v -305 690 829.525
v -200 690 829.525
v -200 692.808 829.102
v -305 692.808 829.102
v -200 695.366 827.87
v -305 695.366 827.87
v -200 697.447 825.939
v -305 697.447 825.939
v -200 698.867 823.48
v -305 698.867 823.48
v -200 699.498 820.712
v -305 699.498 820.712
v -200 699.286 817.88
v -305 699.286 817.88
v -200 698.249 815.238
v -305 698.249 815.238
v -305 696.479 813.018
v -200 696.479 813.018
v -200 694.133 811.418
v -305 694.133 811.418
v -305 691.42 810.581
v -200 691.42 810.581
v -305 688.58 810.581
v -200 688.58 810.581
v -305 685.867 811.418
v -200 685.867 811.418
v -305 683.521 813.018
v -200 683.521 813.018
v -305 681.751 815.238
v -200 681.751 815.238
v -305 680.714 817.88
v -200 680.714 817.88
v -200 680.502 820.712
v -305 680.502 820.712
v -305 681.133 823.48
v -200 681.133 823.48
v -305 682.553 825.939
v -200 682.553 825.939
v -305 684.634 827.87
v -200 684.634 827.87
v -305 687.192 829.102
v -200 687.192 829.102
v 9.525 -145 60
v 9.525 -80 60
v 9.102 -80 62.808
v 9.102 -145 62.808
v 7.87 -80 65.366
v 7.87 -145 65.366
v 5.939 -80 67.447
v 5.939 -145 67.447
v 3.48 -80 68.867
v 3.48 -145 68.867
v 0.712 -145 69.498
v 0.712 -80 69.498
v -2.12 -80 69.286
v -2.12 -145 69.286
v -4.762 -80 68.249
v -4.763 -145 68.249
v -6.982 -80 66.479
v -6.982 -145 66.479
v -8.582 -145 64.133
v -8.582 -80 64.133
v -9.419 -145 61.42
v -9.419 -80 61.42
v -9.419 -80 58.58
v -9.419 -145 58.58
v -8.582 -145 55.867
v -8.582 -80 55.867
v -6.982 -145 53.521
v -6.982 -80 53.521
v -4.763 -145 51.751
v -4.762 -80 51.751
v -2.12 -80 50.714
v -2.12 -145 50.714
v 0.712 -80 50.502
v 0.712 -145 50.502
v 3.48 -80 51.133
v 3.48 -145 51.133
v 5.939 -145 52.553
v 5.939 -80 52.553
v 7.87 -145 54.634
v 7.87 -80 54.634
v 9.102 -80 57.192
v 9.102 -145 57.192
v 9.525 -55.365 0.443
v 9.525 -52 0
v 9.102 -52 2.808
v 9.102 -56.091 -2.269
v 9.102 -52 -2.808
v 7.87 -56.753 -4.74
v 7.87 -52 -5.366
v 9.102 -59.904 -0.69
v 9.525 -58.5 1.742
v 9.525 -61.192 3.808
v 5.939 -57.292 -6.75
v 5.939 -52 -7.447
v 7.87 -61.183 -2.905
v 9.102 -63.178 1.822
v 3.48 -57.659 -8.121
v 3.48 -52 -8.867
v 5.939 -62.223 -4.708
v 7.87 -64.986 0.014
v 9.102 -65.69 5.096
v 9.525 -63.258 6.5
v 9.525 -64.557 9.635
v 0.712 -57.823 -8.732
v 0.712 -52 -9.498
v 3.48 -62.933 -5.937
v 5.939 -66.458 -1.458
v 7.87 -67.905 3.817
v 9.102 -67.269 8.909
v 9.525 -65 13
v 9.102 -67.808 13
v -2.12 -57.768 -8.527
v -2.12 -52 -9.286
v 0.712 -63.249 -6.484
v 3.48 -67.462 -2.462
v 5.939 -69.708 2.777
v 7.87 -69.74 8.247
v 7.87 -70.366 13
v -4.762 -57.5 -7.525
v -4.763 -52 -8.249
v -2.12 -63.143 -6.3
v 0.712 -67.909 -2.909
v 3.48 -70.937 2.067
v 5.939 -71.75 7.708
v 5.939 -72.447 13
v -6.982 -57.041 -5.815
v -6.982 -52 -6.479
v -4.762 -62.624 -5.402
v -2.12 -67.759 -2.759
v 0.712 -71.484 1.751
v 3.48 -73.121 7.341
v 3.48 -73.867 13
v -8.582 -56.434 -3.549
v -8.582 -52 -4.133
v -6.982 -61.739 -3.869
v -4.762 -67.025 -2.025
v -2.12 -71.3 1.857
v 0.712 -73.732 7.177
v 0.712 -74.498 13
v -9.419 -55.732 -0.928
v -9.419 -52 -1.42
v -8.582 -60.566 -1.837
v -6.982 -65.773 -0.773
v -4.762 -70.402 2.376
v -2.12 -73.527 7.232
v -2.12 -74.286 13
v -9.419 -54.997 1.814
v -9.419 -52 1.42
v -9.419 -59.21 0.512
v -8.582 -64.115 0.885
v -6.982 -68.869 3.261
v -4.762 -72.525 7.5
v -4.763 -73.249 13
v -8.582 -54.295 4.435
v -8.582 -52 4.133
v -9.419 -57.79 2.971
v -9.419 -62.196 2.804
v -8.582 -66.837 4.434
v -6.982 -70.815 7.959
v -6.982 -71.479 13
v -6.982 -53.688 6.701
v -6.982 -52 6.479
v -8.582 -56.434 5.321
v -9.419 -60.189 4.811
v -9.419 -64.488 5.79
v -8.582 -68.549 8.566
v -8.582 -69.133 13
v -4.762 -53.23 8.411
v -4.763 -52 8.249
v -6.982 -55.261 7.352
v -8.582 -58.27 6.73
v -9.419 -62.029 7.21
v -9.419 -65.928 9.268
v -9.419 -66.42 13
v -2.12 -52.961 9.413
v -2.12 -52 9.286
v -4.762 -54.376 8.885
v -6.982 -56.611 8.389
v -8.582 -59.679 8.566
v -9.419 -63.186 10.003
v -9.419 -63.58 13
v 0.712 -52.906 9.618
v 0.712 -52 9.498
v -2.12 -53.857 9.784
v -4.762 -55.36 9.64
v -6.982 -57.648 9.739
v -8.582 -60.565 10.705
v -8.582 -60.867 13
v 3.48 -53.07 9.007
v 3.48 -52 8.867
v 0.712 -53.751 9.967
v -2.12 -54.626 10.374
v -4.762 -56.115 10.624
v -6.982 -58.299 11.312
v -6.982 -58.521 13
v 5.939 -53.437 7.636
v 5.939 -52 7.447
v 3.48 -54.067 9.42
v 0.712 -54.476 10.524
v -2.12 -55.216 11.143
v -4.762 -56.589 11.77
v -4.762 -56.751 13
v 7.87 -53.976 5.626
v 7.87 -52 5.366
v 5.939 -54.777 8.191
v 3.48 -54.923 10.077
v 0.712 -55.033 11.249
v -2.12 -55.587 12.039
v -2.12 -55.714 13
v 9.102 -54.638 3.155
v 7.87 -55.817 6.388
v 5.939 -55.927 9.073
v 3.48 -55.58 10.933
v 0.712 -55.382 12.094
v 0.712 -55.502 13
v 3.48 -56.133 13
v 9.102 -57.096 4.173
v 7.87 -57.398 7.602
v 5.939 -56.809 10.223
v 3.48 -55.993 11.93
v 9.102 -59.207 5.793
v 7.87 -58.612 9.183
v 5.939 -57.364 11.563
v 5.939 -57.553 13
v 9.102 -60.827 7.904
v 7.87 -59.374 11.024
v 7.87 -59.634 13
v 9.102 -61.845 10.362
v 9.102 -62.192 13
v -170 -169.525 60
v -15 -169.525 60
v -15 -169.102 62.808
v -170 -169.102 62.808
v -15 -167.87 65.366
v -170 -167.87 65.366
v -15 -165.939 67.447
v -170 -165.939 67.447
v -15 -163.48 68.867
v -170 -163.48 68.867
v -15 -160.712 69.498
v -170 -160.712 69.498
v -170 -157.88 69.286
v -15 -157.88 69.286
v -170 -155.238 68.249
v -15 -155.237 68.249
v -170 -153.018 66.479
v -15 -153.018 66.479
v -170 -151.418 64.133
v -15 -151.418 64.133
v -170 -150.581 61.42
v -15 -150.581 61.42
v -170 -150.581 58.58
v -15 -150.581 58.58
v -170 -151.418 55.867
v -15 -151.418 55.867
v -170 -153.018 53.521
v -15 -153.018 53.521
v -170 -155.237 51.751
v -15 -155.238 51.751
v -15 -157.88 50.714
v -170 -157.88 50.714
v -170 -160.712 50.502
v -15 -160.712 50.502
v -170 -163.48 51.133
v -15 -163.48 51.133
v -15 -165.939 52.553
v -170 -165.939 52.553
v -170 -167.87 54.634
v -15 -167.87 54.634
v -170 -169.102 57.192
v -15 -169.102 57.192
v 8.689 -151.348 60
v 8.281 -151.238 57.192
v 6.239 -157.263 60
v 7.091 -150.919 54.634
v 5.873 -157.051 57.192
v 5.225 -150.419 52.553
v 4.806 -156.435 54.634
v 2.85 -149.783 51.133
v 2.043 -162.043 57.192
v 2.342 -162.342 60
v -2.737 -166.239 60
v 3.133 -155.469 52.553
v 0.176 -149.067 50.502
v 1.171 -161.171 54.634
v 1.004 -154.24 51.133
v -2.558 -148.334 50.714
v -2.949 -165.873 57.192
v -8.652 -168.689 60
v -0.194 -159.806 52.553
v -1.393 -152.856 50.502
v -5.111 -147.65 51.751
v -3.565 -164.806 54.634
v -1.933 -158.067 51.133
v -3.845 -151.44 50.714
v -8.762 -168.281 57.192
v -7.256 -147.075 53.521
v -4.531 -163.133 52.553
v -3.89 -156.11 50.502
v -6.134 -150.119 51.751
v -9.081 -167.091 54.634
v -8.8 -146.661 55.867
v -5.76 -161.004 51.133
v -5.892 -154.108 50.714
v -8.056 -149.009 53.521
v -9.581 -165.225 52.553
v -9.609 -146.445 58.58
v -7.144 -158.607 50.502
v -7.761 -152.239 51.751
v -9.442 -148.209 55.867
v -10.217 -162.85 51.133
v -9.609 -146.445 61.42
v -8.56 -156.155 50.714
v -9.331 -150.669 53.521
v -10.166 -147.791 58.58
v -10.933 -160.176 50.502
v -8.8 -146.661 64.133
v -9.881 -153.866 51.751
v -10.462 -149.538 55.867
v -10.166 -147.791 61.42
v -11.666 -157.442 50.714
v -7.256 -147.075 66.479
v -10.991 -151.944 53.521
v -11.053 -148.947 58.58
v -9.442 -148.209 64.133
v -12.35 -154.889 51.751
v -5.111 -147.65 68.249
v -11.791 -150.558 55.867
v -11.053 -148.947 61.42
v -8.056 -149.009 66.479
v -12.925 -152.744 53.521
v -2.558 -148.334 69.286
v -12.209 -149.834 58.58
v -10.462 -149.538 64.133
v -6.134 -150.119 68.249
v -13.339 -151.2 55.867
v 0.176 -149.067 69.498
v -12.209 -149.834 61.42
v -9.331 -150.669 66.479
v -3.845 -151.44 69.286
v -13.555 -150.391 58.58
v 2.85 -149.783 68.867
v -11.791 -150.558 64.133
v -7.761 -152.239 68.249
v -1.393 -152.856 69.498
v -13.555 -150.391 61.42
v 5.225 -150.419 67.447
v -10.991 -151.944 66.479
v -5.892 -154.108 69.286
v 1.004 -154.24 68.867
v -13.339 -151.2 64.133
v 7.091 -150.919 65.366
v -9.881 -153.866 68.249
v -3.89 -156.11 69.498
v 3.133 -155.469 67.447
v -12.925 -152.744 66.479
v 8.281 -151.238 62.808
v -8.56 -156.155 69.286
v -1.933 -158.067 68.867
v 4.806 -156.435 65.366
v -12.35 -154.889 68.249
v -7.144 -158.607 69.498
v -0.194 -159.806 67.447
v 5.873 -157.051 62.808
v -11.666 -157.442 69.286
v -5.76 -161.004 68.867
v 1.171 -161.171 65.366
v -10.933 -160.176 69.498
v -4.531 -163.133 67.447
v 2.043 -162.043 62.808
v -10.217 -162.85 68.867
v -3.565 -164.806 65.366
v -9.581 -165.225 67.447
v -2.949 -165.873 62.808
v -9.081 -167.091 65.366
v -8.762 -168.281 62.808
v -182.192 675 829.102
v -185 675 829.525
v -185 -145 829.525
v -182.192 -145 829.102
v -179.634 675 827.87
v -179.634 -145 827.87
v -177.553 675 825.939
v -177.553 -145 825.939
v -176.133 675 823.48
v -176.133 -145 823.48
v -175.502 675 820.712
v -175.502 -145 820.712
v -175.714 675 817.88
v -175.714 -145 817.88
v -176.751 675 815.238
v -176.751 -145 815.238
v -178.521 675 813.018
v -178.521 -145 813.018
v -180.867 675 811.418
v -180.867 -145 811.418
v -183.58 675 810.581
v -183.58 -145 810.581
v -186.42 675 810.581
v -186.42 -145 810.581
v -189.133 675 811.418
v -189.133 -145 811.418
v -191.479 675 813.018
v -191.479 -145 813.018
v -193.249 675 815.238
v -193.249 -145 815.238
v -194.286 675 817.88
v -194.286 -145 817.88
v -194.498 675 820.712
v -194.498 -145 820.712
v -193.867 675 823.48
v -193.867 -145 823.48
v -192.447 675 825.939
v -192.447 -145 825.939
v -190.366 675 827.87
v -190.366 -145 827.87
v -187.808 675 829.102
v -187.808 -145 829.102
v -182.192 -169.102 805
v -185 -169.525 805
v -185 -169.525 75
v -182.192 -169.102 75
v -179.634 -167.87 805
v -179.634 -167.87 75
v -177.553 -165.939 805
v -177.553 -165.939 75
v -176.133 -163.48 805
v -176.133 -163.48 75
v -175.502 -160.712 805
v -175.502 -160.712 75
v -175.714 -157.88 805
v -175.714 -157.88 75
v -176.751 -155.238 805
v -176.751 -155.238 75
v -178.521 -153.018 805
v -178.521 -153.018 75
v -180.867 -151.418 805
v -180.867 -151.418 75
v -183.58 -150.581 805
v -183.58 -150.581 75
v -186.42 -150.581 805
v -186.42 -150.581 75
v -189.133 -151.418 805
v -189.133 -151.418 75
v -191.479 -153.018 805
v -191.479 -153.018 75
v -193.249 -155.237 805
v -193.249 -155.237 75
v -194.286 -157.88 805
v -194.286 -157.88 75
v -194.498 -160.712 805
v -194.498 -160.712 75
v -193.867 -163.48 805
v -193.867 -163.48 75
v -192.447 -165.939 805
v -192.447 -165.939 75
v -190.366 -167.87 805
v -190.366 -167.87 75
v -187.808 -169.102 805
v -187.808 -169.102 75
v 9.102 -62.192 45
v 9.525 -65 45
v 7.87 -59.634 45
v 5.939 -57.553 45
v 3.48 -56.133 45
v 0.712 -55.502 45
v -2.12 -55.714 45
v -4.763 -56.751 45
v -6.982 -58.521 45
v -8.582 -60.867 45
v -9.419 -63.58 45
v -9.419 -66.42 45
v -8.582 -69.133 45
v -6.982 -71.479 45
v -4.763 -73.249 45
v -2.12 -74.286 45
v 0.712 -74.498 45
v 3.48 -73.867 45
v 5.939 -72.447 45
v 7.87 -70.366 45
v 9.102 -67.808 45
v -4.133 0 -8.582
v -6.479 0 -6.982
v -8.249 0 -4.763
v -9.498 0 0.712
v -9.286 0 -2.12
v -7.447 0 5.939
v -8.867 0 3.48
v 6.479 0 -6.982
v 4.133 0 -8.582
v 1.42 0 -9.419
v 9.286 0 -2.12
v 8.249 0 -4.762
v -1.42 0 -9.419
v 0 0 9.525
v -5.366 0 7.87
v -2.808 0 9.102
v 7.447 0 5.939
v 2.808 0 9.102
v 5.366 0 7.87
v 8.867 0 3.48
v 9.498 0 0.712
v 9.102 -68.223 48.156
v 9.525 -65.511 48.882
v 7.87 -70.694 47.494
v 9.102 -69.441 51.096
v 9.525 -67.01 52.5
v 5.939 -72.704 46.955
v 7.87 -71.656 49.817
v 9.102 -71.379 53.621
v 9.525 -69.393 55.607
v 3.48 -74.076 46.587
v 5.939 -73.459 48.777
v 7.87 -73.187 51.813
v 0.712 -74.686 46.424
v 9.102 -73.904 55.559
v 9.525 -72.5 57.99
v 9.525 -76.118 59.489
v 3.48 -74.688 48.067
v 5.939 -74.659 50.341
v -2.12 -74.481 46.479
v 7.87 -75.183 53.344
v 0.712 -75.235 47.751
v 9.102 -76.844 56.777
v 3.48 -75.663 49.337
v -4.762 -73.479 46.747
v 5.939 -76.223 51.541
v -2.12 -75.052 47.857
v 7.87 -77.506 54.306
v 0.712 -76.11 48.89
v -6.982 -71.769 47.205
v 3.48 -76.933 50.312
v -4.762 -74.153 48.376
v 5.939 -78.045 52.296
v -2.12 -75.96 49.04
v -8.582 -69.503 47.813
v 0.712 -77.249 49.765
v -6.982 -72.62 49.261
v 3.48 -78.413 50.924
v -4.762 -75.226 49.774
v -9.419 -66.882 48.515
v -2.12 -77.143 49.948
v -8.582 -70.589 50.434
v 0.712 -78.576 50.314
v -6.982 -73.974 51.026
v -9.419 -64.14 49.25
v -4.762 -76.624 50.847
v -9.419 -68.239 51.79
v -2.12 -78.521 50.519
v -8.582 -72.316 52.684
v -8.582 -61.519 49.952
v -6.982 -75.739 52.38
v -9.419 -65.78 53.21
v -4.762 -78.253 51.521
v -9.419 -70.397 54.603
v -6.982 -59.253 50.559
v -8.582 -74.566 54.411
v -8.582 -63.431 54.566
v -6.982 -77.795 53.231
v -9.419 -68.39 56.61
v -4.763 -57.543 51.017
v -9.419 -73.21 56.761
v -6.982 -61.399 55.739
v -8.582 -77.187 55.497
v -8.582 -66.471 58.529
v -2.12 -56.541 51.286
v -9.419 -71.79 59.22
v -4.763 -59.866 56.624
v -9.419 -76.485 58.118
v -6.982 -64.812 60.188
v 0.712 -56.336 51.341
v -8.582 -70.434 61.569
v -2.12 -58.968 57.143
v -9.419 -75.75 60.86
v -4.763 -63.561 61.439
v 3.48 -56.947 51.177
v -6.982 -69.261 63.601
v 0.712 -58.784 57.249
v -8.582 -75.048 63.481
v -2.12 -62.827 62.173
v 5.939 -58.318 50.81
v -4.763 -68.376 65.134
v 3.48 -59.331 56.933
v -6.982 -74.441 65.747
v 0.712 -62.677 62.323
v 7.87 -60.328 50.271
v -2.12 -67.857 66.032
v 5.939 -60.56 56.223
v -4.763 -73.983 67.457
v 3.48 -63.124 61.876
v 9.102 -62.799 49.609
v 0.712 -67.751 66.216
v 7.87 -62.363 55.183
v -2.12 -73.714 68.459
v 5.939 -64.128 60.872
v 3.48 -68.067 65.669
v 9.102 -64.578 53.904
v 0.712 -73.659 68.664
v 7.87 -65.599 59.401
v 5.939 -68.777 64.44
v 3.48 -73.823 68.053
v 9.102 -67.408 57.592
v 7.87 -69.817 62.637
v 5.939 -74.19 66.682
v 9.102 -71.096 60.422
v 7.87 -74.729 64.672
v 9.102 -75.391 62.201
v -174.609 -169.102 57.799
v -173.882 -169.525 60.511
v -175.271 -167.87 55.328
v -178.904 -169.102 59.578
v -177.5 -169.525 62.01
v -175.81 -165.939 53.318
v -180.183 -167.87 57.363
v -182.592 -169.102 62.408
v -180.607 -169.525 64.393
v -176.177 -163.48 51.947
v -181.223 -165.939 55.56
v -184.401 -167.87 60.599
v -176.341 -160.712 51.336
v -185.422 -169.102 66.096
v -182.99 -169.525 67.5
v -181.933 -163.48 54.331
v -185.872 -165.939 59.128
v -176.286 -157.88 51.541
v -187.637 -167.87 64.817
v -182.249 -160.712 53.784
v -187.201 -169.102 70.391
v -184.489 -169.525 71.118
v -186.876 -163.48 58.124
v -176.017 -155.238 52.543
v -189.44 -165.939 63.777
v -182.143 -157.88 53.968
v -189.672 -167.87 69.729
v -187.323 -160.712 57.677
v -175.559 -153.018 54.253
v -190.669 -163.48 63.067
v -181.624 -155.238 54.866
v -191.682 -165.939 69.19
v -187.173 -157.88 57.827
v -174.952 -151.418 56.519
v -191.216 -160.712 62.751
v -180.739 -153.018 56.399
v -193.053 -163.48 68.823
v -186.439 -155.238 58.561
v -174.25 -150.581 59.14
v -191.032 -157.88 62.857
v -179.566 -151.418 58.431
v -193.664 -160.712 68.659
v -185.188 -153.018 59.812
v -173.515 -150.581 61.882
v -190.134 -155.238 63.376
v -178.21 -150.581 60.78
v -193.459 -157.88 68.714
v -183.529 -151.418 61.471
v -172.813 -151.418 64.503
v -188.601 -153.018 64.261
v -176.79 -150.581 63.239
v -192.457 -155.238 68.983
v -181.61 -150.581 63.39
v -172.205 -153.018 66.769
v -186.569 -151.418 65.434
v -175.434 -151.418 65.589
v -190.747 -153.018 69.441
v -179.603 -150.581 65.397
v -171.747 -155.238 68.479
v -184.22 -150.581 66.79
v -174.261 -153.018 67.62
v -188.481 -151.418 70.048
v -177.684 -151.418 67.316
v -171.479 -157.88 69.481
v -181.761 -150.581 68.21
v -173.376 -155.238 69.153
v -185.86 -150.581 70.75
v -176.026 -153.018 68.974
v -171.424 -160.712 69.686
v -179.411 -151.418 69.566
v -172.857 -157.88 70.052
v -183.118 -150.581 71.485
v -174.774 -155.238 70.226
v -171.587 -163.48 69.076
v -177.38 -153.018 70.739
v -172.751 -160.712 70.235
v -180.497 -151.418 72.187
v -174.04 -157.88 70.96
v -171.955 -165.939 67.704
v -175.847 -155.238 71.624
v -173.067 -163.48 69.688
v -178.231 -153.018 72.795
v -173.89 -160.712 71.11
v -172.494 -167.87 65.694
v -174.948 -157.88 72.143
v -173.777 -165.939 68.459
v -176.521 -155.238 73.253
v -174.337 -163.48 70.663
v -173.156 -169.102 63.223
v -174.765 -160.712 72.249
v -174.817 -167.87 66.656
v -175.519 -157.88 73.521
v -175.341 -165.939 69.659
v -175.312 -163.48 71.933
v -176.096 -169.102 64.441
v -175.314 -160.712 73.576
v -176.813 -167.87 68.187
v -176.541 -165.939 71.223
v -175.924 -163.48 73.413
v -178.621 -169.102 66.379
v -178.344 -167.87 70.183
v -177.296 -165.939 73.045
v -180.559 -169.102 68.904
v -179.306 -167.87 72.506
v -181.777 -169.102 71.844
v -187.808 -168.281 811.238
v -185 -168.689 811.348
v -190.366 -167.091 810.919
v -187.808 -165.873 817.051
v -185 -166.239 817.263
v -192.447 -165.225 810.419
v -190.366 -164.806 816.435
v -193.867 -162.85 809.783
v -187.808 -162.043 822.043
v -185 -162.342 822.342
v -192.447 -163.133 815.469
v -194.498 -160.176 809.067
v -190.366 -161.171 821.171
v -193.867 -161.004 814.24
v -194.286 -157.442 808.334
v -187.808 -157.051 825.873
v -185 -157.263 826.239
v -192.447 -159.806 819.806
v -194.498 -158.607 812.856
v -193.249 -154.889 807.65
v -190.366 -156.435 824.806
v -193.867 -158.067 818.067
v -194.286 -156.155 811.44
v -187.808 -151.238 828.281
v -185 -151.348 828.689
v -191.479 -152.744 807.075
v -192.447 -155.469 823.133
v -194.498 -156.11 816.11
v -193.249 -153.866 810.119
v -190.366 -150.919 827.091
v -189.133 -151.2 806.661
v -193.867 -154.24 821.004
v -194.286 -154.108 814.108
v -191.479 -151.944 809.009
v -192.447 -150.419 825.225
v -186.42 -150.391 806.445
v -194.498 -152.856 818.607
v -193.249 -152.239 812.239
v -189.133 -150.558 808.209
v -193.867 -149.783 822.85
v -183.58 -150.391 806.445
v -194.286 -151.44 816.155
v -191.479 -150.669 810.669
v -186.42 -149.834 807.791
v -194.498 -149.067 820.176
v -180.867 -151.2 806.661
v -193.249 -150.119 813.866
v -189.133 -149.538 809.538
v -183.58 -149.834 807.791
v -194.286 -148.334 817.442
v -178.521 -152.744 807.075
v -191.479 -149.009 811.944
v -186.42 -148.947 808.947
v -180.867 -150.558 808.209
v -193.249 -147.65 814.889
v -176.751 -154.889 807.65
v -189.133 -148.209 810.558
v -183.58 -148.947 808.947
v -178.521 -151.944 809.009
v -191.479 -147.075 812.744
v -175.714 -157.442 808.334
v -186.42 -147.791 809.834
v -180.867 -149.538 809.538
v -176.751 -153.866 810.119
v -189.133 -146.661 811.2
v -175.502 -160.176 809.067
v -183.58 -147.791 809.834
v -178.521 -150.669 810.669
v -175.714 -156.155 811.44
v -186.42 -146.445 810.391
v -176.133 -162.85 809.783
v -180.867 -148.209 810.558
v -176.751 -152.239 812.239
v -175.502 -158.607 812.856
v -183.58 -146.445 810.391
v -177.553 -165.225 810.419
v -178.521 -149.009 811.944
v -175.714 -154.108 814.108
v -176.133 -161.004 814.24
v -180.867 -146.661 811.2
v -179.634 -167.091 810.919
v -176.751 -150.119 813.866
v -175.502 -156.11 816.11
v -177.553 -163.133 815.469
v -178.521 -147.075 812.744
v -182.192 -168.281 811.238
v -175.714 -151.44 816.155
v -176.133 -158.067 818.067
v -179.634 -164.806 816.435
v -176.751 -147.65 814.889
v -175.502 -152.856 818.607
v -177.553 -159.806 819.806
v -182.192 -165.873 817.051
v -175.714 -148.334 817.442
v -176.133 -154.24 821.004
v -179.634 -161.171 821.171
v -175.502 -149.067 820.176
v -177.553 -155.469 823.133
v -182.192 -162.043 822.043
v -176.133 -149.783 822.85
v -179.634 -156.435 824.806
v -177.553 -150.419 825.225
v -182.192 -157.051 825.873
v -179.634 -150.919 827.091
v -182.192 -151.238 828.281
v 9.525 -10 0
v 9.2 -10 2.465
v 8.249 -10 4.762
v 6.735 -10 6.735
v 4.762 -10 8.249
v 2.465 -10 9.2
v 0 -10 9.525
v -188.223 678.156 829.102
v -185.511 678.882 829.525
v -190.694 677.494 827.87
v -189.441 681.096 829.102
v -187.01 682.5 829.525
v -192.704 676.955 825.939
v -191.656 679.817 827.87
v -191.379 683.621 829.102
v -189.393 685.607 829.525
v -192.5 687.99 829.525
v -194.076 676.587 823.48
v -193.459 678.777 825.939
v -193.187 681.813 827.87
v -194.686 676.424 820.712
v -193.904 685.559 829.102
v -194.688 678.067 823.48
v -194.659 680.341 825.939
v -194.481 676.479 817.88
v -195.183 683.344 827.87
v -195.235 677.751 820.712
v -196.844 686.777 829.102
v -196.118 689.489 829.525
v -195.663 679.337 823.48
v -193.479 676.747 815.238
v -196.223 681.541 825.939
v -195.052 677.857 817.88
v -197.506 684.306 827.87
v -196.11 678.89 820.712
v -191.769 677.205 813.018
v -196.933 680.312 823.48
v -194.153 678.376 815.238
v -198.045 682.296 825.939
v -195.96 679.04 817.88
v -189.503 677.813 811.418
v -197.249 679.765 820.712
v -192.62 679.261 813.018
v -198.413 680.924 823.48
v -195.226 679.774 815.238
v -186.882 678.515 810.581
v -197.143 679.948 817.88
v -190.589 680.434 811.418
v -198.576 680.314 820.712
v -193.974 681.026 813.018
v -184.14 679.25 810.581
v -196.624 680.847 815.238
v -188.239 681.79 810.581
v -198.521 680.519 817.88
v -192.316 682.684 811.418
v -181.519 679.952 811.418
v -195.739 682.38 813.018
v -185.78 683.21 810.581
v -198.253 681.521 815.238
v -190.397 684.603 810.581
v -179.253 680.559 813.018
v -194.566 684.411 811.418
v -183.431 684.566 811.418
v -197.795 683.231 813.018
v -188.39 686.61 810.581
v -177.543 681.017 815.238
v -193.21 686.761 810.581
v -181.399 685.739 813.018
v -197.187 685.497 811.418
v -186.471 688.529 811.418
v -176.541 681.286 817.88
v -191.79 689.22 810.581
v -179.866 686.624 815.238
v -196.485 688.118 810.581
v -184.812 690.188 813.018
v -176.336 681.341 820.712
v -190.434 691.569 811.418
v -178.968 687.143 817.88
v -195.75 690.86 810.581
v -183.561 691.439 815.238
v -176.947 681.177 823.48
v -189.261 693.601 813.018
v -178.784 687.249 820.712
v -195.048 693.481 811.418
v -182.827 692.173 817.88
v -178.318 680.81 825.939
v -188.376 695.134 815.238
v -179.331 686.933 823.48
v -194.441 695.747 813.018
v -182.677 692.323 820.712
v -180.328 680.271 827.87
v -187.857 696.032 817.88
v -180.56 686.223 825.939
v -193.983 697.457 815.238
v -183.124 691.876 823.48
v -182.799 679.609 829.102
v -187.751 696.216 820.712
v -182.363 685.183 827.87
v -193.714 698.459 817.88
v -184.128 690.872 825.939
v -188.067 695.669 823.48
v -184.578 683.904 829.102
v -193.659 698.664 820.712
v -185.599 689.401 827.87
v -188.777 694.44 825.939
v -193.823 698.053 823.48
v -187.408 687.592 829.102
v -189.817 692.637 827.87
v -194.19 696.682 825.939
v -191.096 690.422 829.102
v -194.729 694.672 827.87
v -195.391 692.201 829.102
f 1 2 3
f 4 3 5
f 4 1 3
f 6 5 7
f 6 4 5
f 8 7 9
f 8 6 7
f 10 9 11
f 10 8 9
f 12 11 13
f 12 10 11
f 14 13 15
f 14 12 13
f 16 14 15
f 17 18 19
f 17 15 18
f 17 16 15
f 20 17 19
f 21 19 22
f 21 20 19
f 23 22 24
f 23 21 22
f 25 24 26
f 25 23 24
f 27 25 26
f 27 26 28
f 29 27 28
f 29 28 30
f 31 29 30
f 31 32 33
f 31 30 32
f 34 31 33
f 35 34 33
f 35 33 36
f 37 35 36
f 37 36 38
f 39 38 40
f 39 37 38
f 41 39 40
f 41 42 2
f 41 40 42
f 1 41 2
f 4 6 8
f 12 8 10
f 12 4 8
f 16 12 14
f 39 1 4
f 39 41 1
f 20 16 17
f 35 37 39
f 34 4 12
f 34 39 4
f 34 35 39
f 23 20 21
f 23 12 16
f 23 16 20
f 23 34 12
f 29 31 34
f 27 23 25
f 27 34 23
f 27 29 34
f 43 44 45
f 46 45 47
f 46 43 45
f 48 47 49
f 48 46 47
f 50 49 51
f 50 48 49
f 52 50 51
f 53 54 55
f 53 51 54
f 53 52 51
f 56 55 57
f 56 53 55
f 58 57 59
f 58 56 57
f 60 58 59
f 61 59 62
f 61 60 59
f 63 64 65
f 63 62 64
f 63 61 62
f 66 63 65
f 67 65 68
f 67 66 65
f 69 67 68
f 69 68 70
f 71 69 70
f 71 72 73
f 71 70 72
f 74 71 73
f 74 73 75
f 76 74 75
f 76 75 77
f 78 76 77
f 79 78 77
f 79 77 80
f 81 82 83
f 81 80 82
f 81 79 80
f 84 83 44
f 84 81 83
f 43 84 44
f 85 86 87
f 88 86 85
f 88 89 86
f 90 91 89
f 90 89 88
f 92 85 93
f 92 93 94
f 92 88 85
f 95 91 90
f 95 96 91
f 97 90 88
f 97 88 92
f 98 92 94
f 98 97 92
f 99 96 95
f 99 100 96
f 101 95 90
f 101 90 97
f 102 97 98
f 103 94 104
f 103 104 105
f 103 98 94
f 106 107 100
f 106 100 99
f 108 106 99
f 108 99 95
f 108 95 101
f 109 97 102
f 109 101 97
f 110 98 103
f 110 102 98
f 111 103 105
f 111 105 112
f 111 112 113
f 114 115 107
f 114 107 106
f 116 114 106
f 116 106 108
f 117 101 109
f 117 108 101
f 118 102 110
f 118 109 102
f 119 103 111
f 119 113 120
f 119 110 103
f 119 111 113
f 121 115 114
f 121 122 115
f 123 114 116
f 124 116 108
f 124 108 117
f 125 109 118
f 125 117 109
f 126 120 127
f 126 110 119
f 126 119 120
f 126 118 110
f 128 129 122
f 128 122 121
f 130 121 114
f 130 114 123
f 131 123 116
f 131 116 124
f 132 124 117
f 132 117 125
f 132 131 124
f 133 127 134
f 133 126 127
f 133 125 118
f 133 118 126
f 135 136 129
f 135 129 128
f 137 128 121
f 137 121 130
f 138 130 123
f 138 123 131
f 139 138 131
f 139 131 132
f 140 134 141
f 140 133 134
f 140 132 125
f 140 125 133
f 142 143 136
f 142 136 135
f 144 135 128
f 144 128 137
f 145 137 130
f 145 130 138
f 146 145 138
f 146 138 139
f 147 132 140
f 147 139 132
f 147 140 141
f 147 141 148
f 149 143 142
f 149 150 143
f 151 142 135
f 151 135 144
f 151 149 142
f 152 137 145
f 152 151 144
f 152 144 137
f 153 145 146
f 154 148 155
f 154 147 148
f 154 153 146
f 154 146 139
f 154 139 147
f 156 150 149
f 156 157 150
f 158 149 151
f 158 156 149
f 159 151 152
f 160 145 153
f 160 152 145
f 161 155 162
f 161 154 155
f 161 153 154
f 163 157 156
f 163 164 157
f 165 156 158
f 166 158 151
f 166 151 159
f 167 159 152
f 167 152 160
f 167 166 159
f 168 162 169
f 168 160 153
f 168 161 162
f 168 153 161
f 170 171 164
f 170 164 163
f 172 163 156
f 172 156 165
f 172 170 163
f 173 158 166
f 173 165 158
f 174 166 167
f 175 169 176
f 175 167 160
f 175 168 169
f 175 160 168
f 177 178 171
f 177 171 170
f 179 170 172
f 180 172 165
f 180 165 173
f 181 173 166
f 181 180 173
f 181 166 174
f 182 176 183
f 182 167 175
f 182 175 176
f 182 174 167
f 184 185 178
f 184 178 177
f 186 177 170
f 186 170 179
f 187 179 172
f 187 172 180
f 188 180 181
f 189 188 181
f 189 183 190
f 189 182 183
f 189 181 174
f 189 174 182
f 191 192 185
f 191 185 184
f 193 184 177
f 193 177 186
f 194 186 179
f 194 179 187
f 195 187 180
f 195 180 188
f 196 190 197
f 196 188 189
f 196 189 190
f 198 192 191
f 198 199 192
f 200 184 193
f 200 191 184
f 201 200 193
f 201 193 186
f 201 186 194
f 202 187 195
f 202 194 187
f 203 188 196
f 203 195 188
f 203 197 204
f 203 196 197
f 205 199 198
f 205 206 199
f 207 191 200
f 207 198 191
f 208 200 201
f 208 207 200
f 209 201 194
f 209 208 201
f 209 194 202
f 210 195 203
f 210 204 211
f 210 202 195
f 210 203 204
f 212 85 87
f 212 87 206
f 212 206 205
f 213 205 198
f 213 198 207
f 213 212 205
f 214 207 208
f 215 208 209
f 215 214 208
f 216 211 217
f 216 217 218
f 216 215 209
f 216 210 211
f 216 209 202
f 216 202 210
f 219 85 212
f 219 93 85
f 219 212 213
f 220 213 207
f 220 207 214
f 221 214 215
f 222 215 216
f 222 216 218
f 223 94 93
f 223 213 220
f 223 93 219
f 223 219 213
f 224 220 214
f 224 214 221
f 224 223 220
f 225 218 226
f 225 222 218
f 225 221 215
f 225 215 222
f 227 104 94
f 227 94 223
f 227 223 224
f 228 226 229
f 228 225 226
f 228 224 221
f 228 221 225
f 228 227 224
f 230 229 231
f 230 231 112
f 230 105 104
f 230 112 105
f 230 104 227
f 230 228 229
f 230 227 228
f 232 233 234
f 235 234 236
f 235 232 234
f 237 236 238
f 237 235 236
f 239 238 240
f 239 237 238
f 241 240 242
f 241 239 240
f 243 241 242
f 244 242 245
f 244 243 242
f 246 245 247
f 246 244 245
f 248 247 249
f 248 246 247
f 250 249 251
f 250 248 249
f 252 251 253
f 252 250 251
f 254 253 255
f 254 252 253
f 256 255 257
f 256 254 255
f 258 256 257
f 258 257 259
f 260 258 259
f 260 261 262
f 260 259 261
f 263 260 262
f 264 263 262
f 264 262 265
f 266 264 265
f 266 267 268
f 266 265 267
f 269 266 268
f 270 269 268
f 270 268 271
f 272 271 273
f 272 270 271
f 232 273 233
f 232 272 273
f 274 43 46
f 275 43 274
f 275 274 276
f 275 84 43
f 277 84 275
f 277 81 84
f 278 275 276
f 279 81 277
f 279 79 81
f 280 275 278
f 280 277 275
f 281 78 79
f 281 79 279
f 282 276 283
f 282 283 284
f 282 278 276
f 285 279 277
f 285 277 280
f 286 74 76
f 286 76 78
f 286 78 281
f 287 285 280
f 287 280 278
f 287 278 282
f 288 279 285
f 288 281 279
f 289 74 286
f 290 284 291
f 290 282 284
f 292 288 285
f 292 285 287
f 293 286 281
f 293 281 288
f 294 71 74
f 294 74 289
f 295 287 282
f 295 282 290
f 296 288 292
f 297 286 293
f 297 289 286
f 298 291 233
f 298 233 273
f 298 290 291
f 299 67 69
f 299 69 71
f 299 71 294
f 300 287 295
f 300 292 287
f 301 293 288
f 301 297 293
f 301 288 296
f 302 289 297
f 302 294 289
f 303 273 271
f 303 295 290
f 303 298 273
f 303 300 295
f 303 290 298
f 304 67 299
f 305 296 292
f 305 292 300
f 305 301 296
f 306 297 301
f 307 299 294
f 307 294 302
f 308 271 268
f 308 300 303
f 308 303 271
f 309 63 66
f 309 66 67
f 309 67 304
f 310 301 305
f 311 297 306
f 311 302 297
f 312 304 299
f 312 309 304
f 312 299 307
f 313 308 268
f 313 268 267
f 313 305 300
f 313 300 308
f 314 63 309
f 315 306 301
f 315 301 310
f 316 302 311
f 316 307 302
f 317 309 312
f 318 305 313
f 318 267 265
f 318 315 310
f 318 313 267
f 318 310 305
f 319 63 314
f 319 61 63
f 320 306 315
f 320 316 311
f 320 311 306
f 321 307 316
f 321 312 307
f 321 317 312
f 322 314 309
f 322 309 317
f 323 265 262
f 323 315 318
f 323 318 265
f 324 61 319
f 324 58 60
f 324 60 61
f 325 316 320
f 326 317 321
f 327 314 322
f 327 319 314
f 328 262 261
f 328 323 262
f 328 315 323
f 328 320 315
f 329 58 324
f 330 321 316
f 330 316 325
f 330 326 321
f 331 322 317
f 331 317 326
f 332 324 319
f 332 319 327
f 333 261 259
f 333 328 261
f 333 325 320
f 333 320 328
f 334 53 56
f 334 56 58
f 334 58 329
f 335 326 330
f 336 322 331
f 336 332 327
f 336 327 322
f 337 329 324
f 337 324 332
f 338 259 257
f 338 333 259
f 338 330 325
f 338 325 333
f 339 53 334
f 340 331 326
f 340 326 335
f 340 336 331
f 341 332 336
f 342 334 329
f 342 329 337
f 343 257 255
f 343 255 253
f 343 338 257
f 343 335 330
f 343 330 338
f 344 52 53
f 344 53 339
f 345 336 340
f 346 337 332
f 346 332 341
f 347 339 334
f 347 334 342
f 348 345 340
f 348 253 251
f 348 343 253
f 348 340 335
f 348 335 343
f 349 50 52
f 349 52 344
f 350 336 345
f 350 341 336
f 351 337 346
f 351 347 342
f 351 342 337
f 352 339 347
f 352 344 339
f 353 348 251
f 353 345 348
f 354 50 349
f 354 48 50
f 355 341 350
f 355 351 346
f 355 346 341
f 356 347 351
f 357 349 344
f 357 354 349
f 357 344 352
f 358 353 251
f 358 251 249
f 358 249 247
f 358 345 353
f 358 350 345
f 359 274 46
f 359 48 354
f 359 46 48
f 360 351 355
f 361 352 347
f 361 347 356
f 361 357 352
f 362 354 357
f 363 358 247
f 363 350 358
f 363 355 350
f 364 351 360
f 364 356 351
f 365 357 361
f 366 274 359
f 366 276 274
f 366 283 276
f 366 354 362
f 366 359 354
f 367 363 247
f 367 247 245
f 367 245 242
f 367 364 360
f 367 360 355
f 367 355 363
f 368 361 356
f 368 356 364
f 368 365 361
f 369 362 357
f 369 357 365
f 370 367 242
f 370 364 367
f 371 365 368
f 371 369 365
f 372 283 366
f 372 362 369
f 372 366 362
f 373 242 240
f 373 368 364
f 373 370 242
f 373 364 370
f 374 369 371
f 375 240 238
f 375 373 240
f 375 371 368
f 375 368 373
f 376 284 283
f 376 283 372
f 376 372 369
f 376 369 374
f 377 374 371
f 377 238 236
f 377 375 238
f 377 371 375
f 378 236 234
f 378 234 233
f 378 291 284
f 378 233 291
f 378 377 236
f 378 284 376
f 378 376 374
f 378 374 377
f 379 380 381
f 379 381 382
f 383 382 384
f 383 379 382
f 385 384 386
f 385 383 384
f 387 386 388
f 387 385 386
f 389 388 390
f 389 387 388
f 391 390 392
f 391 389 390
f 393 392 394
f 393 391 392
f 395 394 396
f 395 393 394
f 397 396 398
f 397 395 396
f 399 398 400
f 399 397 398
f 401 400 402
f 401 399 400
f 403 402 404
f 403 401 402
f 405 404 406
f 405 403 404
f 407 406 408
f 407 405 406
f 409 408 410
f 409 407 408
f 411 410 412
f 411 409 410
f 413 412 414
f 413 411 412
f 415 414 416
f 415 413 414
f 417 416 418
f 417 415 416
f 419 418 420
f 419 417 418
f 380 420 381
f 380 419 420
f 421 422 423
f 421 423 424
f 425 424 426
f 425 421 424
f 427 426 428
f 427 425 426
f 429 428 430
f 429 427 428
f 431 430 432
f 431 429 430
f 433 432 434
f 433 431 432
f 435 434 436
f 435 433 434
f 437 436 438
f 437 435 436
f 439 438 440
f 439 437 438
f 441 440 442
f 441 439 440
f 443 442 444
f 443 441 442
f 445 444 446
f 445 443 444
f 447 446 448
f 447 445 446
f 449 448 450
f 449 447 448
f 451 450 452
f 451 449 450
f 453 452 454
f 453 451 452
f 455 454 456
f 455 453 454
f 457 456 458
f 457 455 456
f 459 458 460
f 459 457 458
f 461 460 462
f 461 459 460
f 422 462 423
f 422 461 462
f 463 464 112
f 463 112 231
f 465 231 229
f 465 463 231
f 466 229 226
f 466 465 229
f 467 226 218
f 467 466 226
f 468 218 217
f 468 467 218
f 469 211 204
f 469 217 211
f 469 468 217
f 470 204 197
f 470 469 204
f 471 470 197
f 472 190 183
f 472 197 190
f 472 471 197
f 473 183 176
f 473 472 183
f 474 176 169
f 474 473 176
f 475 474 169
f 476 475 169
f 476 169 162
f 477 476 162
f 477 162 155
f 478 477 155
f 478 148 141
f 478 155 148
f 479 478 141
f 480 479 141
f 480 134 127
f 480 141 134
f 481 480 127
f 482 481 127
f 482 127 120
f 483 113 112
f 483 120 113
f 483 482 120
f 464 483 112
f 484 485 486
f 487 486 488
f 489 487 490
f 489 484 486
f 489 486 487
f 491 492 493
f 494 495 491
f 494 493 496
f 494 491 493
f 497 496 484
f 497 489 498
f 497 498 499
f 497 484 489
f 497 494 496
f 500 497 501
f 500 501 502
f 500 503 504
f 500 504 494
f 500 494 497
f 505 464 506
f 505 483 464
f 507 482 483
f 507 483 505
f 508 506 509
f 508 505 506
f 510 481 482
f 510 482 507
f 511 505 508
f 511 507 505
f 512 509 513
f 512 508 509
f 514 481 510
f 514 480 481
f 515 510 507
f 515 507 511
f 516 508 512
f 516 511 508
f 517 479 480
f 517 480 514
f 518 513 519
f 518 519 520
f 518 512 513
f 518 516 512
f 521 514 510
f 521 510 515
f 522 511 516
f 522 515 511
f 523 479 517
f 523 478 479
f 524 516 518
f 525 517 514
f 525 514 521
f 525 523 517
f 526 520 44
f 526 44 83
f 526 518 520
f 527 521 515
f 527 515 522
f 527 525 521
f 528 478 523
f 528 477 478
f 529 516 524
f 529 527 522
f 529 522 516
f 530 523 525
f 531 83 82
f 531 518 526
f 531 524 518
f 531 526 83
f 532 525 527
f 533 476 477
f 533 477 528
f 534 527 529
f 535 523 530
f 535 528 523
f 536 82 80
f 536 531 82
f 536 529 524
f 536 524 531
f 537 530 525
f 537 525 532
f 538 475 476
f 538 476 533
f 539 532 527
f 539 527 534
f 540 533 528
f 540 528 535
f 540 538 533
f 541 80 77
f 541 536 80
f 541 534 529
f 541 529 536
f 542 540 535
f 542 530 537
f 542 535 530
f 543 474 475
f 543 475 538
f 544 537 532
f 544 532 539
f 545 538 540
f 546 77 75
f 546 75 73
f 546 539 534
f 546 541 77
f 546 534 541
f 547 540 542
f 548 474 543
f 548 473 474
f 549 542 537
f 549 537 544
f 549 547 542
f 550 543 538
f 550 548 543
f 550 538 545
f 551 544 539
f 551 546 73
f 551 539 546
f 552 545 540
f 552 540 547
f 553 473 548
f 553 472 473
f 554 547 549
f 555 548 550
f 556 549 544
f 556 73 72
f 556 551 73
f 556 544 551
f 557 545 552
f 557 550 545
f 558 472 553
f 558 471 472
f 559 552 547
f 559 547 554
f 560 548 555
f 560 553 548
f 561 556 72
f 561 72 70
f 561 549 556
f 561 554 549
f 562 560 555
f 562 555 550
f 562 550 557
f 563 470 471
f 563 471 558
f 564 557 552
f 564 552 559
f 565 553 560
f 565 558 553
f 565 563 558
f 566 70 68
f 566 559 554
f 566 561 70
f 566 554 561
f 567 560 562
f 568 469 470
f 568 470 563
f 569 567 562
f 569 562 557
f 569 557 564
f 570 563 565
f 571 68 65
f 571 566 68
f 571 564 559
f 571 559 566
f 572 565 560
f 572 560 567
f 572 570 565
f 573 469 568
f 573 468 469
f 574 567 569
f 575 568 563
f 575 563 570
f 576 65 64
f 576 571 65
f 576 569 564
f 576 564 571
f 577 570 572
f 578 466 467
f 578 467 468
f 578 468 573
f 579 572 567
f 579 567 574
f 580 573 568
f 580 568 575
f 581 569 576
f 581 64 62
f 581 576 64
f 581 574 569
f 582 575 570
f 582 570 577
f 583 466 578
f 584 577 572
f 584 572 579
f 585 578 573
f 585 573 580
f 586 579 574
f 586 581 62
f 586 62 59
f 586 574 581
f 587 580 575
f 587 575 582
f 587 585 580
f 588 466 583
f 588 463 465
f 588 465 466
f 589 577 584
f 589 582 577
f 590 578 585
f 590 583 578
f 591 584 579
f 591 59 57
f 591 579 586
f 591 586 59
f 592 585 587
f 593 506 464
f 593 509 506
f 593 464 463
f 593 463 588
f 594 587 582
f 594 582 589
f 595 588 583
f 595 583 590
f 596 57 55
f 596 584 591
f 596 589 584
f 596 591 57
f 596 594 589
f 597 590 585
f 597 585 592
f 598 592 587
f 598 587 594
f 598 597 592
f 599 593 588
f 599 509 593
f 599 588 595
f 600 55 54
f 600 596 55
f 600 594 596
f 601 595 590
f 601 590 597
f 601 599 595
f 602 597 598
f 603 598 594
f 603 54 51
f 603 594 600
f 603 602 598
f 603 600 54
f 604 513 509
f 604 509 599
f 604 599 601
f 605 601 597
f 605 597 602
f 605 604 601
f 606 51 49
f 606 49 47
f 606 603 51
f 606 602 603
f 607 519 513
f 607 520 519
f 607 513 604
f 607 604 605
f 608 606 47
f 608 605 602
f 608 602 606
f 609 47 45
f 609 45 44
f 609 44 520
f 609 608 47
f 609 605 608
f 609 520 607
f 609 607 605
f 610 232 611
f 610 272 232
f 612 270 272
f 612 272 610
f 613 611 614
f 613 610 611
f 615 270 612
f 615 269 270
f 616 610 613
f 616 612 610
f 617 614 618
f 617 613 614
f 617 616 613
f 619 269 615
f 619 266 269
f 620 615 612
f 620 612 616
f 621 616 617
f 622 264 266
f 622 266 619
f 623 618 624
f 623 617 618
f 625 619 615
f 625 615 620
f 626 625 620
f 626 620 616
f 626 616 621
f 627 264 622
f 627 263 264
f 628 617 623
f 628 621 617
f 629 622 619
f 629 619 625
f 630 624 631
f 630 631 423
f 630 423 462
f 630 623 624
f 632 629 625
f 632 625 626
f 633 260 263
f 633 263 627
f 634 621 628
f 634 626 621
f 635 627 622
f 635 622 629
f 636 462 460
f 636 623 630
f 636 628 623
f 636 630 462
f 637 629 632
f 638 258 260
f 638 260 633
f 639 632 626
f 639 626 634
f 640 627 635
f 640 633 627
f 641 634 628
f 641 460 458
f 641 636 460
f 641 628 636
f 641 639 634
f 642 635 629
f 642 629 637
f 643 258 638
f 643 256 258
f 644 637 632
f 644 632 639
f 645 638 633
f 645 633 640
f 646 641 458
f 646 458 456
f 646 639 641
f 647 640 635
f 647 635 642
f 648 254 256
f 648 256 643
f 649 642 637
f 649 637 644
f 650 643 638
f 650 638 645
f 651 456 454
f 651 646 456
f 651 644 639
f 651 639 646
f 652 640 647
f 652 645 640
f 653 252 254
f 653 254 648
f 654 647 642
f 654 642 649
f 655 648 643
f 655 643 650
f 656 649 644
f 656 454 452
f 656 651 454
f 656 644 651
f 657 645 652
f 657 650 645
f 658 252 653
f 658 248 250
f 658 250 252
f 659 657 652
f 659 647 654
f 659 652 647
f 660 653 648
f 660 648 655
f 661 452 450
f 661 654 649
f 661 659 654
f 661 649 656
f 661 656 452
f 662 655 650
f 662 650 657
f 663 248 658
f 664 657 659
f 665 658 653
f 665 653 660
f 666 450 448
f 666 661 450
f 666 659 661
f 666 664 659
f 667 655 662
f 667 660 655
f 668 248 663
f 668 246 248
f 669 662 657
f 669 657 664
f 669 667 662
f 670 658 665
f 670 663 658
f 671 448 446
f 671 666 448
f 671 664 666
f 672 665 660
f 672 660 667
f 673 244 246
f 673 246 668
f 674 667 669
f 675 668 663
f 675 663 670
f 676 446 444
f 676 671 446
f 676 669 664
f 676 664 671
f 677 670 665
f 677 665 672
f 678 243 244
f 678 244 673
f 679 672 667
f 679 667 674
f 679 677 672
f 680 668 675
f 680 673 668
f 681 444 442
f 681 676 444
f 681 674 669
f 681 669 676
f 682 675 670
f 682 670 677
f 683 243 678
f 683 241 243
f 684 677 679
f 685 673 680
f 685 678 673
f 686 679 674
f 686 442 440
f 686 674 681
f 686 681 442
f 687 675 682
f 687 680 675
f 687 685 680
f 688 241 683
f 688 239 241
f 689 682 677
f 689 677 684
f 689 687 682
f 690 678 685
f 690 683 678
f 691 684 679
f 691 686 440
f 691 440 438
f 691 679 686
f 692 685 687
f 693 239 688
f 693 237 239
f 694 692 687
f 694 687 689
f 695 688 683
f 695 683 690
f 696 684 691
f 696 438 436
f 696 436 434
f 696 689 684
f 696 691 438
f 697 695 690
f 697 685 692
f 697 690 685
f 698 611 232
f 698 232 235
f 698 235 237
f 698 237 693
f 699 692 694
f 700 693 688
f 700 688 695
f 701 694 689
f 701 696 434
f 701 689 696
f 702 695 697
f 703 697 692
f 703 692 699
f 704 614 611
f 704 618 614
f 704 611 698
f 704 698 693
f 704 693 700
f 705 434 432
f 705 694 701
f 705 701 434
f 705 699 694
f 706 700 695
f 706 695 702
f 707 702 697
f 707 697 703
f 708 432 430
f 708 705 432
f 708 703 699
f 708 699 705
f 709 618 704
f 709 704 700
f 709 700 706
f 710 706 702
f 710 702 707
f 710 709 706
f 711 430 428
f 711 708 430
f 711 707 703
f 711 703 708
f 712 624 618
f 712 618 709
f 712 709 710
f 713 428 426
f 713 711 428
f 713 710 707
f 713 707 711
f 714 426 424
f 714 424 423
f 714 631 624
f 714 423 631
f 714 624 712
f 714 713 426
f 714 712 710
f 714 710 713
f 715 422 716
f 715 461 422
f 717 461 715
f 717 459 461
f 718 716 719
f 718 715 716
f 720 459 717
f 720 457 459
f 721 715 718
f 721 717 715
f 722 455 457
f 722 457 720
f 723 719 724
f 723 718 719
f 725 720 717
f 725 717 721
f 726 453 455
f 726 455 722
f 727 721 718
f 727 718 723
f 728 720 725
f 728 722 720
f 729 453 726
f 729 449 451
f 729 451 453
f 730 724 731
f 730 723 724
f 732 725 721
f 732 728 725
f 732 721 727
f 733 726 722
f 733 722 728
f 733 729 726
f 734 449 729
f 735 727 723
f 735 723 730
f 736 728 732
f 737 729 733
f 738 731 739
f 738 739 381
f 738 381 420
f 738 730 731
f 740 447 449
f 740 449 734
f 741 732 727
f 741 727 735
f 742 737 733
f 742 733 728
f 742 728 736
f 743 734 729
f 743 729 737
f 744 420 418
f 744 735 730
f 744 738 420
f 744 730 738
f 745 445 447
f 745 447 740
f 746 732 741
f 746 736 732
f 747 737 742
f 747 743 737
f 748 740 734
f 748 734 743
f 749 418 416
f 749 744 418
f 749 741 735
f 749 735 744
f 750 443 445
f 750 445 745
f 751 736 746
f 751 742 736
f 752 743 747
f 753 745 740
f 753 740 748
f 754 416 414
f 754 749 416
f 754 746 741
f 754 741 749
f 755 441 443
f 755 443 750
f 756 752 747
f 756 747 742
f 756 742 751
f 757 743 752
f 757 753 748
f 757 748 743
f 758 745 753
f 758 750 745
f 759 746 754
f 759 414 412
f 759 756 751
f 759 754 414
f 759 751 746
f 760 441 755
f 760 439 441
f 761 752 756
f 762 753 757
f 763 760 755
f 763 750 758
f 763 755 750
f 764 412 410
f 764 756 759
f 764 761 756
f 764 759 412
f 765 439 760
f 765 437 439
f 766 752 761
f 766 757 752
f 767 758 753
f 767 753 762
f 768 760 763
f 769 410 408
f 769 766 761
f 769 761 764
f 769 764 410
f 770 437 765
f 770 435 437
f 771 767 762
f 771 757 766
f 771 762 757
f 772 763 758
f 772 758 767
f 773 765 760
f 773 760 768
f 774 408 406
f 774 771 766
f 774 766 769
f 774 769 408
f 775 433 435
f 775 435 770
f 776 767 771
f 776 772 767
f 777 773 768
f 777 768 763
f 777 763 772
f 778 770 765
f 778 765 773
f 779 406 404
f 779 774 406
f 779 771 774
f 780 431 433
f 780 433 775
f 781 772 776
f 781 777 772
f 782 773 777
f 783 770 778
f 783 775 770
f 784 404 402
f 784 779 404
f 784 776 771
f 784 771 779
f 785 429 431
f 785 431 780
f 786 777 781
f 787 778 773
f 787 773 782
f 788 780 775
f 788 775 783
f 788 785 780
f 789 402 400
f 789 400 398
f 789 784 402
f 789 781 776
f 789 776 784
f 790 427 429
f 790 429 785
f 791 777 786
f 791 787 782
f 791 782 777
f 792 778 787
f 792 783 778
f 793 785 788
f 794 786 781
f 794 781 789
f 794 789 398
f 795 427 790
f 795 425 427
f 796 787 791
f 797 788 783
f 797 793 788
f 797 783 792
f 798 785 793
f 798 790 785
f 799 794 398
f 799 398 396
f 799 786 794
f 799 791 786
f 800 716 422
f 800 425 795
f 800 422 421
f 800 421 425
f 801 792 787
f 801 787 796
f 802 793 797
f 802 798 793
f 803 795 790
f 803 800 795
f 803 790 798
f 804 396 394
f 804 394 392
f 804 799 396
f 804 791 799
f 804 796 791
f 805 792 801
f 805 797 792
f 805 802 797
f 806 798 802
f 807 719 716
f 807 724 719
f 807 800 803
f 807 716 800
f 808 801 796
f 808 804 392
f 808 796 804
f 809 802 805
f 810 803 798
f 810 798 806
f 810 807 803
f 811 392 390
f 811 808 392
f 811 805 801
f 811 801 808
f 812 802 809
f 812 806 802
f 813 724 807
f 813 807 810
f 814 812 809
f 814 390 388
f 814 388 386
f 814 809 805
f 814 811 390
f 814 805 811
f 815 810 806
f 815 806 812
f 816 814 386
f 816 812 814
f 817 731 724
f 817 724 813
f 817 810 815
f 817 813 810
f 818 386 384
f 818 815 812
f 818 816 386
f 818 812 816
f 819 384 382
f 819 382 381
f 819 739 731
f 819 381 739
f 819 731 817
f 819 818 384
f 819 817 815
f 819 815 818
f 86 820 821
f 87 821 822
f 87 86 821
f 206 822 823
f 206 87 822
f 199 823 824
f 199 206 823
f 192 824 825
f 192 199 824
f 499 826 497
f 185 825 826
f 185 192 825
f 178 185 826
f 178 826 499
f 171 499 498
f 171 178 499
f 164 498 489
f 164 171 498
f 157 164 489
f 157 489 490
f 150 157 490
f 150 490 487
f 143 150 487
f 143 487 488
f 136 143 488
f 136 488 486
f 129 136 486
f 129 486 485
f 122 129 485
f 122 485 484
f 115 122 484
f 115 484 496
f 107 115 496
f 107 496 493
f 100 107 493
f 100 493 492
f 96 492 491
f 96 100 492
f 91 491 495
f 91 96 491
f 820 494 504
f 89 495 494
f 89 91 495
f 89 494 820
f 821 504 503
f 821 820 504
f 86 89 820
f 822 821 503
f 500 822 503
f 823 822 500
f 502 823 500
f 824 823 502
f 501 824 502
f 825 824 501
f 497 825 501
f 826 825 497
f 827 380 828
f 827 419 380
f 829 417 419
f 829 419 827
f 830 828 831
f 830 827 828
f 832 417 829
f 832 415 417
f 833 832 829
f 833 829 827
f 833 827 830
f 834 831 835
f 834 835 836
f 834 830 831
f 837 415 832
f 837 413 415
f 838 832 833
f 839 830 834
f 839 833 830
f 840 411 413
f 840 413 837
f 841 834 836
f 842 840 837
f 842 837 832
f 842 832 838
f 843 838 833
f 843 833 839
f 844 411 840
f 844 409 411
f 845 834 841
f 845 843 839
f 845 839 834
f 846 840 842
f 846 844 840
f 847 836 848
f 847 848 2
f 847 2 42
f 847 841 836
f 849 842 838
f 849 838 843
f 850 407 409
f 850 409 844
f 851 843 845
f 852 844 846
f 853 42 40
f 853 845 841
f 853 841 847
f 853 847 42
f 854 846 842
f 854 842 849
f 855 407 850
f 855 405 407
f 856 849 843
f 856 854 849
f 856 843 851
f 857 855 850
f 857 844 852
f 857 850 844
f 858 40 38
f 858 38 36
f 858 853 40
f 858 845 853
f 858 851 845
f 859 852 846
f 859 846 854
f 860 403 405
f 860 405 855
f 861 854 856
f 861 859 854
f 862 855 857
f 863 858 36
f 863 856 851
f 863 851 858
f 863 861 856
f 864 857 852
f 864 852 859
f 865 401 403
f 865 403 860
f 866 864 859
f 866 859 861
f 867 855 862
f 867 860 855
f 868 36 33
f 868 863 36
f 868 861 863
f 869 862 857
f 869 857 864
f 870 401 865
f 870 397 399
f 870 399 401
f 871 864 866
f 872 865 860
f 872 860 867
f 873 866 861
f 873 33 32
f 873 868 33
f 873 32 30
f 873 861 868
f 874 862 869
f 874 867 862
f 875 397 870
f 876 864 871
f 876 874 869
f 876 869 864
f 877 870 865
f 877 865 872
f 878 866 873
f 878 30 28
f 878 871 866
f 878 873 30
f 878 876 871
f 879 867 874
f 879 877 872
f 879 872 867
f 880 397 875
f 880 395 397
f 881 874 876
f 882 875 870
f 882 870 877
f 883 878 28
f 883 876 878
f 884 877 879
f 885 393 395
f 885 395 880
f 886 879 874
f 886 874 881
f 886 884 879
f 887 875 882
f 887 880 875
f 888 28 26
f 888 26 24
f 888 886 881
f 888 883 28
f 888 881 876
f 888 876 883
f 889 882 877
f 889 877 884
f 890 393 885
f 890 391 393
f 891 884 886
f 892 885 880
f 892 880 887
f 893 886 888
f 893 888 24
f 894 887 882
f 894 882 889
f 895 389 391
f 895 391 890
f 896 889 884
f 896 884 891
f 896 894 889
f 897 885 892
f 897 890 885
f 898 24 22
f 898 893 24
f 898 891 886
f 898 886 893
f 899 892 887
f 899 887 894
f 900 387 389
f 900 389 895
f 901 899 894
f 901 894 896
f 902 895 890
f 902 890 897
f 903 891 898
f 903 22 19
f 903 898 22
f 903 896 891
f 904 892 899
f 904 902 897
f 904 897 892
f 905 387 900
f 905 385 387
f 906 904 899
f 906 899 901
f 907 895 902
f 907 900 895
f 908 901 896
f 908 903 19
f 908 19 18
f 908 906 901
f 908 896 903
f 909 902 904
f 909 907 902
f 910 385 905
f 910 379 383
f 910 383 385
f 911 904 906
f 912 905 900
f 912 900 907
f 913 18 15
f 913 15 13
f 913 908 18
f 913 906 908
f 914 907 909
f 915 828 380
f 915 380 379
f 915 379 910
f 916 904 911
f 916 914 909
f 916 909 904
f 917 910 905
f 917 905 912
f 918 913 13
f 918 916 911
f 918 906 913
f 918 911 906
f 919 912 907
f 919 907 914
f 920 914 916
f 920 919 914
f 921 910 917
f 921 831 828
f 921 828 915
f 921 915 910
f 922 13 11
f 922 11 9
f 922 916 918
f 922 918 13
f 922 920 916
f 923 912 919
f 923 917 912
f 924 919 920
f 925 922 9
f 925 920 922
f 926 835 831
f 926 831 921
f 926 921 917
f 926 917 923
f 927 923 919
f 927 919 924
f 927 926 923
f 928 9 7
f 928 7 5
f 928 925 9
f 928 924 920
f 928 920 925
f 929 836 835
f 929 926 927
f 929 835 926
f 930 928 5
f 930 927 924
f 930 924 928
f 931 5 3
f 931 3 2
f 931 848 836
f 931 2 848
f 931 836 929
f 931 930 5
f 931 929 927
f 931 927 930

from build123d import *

# Parameters (mm, degrees)
CROQUIS1_R              = 9.525
SALIENTE_EXTRUIR1_DEPTH = 10
CROQUIS2_R              = 9.525


with BuildPart() as part:
    # Croquis1 → Saliente-Extruir1 (new body)
    with BuildSketch(Plane(origin=(0, 0, 0), x_dir=(1, 0, 0), z_dir=(0, 1, 0))):
        with Locations(Location((0, 0, 0), (0, 0, 270))):
            Circle(CROQUIS1_R)
    extrude(amount=-SALIENTE_EXTRUIR1_DEPTH)

    # Barrer1: sweep along a curve in space
    with BuildLine() as barrer1_path:
        Line((0, -10, 0), (0, -52, 0))
        ThreePointArc((0, -52, 0), (0, -61.192388155, 3.807611845), (0, -65, 13))
        Line((0, -65, 13), (0, -65, 45))
        ThreePointArc((0, -65, 45), (0, -69.393398282, 55.606601718), (0, -80, 60))
        Line((0, -80, 60), (0, -145, 60))
        ThreePointArc((0, -145, 60), (-4.393398282, -155.606601718, 60), (-15, -160, 60))
        Line((-15, -160, 60), (-170, -160, 60))
        ThreePointArc((-170, -160, 60), (-180.606601718, -160, 64.393398282), (-185, -160, 75))
        Line((-185, -160, 75), (-185, -160, 805))
        ThreePointArc((-185, -160, 805), (-185, -155.606601718, 815.606601718), (-185, -145, 820))
        Line((-185, -145, 820), (-185, 675, 820))
        ThreePointArc((-185, 675, 820), (-189.393398282, 685.606601718, 820), (-200, 690, 820))
        Line((-200, 690, 820), (-305, 690, 820))
    # Croquis2 → Barrer1 (sweep)
    with BuildSketch(Plane.XZ.offset(10)):
        Circle(CROQUIS2_R)
    sweep(path=barrer1_path.line)


solid = part.part
